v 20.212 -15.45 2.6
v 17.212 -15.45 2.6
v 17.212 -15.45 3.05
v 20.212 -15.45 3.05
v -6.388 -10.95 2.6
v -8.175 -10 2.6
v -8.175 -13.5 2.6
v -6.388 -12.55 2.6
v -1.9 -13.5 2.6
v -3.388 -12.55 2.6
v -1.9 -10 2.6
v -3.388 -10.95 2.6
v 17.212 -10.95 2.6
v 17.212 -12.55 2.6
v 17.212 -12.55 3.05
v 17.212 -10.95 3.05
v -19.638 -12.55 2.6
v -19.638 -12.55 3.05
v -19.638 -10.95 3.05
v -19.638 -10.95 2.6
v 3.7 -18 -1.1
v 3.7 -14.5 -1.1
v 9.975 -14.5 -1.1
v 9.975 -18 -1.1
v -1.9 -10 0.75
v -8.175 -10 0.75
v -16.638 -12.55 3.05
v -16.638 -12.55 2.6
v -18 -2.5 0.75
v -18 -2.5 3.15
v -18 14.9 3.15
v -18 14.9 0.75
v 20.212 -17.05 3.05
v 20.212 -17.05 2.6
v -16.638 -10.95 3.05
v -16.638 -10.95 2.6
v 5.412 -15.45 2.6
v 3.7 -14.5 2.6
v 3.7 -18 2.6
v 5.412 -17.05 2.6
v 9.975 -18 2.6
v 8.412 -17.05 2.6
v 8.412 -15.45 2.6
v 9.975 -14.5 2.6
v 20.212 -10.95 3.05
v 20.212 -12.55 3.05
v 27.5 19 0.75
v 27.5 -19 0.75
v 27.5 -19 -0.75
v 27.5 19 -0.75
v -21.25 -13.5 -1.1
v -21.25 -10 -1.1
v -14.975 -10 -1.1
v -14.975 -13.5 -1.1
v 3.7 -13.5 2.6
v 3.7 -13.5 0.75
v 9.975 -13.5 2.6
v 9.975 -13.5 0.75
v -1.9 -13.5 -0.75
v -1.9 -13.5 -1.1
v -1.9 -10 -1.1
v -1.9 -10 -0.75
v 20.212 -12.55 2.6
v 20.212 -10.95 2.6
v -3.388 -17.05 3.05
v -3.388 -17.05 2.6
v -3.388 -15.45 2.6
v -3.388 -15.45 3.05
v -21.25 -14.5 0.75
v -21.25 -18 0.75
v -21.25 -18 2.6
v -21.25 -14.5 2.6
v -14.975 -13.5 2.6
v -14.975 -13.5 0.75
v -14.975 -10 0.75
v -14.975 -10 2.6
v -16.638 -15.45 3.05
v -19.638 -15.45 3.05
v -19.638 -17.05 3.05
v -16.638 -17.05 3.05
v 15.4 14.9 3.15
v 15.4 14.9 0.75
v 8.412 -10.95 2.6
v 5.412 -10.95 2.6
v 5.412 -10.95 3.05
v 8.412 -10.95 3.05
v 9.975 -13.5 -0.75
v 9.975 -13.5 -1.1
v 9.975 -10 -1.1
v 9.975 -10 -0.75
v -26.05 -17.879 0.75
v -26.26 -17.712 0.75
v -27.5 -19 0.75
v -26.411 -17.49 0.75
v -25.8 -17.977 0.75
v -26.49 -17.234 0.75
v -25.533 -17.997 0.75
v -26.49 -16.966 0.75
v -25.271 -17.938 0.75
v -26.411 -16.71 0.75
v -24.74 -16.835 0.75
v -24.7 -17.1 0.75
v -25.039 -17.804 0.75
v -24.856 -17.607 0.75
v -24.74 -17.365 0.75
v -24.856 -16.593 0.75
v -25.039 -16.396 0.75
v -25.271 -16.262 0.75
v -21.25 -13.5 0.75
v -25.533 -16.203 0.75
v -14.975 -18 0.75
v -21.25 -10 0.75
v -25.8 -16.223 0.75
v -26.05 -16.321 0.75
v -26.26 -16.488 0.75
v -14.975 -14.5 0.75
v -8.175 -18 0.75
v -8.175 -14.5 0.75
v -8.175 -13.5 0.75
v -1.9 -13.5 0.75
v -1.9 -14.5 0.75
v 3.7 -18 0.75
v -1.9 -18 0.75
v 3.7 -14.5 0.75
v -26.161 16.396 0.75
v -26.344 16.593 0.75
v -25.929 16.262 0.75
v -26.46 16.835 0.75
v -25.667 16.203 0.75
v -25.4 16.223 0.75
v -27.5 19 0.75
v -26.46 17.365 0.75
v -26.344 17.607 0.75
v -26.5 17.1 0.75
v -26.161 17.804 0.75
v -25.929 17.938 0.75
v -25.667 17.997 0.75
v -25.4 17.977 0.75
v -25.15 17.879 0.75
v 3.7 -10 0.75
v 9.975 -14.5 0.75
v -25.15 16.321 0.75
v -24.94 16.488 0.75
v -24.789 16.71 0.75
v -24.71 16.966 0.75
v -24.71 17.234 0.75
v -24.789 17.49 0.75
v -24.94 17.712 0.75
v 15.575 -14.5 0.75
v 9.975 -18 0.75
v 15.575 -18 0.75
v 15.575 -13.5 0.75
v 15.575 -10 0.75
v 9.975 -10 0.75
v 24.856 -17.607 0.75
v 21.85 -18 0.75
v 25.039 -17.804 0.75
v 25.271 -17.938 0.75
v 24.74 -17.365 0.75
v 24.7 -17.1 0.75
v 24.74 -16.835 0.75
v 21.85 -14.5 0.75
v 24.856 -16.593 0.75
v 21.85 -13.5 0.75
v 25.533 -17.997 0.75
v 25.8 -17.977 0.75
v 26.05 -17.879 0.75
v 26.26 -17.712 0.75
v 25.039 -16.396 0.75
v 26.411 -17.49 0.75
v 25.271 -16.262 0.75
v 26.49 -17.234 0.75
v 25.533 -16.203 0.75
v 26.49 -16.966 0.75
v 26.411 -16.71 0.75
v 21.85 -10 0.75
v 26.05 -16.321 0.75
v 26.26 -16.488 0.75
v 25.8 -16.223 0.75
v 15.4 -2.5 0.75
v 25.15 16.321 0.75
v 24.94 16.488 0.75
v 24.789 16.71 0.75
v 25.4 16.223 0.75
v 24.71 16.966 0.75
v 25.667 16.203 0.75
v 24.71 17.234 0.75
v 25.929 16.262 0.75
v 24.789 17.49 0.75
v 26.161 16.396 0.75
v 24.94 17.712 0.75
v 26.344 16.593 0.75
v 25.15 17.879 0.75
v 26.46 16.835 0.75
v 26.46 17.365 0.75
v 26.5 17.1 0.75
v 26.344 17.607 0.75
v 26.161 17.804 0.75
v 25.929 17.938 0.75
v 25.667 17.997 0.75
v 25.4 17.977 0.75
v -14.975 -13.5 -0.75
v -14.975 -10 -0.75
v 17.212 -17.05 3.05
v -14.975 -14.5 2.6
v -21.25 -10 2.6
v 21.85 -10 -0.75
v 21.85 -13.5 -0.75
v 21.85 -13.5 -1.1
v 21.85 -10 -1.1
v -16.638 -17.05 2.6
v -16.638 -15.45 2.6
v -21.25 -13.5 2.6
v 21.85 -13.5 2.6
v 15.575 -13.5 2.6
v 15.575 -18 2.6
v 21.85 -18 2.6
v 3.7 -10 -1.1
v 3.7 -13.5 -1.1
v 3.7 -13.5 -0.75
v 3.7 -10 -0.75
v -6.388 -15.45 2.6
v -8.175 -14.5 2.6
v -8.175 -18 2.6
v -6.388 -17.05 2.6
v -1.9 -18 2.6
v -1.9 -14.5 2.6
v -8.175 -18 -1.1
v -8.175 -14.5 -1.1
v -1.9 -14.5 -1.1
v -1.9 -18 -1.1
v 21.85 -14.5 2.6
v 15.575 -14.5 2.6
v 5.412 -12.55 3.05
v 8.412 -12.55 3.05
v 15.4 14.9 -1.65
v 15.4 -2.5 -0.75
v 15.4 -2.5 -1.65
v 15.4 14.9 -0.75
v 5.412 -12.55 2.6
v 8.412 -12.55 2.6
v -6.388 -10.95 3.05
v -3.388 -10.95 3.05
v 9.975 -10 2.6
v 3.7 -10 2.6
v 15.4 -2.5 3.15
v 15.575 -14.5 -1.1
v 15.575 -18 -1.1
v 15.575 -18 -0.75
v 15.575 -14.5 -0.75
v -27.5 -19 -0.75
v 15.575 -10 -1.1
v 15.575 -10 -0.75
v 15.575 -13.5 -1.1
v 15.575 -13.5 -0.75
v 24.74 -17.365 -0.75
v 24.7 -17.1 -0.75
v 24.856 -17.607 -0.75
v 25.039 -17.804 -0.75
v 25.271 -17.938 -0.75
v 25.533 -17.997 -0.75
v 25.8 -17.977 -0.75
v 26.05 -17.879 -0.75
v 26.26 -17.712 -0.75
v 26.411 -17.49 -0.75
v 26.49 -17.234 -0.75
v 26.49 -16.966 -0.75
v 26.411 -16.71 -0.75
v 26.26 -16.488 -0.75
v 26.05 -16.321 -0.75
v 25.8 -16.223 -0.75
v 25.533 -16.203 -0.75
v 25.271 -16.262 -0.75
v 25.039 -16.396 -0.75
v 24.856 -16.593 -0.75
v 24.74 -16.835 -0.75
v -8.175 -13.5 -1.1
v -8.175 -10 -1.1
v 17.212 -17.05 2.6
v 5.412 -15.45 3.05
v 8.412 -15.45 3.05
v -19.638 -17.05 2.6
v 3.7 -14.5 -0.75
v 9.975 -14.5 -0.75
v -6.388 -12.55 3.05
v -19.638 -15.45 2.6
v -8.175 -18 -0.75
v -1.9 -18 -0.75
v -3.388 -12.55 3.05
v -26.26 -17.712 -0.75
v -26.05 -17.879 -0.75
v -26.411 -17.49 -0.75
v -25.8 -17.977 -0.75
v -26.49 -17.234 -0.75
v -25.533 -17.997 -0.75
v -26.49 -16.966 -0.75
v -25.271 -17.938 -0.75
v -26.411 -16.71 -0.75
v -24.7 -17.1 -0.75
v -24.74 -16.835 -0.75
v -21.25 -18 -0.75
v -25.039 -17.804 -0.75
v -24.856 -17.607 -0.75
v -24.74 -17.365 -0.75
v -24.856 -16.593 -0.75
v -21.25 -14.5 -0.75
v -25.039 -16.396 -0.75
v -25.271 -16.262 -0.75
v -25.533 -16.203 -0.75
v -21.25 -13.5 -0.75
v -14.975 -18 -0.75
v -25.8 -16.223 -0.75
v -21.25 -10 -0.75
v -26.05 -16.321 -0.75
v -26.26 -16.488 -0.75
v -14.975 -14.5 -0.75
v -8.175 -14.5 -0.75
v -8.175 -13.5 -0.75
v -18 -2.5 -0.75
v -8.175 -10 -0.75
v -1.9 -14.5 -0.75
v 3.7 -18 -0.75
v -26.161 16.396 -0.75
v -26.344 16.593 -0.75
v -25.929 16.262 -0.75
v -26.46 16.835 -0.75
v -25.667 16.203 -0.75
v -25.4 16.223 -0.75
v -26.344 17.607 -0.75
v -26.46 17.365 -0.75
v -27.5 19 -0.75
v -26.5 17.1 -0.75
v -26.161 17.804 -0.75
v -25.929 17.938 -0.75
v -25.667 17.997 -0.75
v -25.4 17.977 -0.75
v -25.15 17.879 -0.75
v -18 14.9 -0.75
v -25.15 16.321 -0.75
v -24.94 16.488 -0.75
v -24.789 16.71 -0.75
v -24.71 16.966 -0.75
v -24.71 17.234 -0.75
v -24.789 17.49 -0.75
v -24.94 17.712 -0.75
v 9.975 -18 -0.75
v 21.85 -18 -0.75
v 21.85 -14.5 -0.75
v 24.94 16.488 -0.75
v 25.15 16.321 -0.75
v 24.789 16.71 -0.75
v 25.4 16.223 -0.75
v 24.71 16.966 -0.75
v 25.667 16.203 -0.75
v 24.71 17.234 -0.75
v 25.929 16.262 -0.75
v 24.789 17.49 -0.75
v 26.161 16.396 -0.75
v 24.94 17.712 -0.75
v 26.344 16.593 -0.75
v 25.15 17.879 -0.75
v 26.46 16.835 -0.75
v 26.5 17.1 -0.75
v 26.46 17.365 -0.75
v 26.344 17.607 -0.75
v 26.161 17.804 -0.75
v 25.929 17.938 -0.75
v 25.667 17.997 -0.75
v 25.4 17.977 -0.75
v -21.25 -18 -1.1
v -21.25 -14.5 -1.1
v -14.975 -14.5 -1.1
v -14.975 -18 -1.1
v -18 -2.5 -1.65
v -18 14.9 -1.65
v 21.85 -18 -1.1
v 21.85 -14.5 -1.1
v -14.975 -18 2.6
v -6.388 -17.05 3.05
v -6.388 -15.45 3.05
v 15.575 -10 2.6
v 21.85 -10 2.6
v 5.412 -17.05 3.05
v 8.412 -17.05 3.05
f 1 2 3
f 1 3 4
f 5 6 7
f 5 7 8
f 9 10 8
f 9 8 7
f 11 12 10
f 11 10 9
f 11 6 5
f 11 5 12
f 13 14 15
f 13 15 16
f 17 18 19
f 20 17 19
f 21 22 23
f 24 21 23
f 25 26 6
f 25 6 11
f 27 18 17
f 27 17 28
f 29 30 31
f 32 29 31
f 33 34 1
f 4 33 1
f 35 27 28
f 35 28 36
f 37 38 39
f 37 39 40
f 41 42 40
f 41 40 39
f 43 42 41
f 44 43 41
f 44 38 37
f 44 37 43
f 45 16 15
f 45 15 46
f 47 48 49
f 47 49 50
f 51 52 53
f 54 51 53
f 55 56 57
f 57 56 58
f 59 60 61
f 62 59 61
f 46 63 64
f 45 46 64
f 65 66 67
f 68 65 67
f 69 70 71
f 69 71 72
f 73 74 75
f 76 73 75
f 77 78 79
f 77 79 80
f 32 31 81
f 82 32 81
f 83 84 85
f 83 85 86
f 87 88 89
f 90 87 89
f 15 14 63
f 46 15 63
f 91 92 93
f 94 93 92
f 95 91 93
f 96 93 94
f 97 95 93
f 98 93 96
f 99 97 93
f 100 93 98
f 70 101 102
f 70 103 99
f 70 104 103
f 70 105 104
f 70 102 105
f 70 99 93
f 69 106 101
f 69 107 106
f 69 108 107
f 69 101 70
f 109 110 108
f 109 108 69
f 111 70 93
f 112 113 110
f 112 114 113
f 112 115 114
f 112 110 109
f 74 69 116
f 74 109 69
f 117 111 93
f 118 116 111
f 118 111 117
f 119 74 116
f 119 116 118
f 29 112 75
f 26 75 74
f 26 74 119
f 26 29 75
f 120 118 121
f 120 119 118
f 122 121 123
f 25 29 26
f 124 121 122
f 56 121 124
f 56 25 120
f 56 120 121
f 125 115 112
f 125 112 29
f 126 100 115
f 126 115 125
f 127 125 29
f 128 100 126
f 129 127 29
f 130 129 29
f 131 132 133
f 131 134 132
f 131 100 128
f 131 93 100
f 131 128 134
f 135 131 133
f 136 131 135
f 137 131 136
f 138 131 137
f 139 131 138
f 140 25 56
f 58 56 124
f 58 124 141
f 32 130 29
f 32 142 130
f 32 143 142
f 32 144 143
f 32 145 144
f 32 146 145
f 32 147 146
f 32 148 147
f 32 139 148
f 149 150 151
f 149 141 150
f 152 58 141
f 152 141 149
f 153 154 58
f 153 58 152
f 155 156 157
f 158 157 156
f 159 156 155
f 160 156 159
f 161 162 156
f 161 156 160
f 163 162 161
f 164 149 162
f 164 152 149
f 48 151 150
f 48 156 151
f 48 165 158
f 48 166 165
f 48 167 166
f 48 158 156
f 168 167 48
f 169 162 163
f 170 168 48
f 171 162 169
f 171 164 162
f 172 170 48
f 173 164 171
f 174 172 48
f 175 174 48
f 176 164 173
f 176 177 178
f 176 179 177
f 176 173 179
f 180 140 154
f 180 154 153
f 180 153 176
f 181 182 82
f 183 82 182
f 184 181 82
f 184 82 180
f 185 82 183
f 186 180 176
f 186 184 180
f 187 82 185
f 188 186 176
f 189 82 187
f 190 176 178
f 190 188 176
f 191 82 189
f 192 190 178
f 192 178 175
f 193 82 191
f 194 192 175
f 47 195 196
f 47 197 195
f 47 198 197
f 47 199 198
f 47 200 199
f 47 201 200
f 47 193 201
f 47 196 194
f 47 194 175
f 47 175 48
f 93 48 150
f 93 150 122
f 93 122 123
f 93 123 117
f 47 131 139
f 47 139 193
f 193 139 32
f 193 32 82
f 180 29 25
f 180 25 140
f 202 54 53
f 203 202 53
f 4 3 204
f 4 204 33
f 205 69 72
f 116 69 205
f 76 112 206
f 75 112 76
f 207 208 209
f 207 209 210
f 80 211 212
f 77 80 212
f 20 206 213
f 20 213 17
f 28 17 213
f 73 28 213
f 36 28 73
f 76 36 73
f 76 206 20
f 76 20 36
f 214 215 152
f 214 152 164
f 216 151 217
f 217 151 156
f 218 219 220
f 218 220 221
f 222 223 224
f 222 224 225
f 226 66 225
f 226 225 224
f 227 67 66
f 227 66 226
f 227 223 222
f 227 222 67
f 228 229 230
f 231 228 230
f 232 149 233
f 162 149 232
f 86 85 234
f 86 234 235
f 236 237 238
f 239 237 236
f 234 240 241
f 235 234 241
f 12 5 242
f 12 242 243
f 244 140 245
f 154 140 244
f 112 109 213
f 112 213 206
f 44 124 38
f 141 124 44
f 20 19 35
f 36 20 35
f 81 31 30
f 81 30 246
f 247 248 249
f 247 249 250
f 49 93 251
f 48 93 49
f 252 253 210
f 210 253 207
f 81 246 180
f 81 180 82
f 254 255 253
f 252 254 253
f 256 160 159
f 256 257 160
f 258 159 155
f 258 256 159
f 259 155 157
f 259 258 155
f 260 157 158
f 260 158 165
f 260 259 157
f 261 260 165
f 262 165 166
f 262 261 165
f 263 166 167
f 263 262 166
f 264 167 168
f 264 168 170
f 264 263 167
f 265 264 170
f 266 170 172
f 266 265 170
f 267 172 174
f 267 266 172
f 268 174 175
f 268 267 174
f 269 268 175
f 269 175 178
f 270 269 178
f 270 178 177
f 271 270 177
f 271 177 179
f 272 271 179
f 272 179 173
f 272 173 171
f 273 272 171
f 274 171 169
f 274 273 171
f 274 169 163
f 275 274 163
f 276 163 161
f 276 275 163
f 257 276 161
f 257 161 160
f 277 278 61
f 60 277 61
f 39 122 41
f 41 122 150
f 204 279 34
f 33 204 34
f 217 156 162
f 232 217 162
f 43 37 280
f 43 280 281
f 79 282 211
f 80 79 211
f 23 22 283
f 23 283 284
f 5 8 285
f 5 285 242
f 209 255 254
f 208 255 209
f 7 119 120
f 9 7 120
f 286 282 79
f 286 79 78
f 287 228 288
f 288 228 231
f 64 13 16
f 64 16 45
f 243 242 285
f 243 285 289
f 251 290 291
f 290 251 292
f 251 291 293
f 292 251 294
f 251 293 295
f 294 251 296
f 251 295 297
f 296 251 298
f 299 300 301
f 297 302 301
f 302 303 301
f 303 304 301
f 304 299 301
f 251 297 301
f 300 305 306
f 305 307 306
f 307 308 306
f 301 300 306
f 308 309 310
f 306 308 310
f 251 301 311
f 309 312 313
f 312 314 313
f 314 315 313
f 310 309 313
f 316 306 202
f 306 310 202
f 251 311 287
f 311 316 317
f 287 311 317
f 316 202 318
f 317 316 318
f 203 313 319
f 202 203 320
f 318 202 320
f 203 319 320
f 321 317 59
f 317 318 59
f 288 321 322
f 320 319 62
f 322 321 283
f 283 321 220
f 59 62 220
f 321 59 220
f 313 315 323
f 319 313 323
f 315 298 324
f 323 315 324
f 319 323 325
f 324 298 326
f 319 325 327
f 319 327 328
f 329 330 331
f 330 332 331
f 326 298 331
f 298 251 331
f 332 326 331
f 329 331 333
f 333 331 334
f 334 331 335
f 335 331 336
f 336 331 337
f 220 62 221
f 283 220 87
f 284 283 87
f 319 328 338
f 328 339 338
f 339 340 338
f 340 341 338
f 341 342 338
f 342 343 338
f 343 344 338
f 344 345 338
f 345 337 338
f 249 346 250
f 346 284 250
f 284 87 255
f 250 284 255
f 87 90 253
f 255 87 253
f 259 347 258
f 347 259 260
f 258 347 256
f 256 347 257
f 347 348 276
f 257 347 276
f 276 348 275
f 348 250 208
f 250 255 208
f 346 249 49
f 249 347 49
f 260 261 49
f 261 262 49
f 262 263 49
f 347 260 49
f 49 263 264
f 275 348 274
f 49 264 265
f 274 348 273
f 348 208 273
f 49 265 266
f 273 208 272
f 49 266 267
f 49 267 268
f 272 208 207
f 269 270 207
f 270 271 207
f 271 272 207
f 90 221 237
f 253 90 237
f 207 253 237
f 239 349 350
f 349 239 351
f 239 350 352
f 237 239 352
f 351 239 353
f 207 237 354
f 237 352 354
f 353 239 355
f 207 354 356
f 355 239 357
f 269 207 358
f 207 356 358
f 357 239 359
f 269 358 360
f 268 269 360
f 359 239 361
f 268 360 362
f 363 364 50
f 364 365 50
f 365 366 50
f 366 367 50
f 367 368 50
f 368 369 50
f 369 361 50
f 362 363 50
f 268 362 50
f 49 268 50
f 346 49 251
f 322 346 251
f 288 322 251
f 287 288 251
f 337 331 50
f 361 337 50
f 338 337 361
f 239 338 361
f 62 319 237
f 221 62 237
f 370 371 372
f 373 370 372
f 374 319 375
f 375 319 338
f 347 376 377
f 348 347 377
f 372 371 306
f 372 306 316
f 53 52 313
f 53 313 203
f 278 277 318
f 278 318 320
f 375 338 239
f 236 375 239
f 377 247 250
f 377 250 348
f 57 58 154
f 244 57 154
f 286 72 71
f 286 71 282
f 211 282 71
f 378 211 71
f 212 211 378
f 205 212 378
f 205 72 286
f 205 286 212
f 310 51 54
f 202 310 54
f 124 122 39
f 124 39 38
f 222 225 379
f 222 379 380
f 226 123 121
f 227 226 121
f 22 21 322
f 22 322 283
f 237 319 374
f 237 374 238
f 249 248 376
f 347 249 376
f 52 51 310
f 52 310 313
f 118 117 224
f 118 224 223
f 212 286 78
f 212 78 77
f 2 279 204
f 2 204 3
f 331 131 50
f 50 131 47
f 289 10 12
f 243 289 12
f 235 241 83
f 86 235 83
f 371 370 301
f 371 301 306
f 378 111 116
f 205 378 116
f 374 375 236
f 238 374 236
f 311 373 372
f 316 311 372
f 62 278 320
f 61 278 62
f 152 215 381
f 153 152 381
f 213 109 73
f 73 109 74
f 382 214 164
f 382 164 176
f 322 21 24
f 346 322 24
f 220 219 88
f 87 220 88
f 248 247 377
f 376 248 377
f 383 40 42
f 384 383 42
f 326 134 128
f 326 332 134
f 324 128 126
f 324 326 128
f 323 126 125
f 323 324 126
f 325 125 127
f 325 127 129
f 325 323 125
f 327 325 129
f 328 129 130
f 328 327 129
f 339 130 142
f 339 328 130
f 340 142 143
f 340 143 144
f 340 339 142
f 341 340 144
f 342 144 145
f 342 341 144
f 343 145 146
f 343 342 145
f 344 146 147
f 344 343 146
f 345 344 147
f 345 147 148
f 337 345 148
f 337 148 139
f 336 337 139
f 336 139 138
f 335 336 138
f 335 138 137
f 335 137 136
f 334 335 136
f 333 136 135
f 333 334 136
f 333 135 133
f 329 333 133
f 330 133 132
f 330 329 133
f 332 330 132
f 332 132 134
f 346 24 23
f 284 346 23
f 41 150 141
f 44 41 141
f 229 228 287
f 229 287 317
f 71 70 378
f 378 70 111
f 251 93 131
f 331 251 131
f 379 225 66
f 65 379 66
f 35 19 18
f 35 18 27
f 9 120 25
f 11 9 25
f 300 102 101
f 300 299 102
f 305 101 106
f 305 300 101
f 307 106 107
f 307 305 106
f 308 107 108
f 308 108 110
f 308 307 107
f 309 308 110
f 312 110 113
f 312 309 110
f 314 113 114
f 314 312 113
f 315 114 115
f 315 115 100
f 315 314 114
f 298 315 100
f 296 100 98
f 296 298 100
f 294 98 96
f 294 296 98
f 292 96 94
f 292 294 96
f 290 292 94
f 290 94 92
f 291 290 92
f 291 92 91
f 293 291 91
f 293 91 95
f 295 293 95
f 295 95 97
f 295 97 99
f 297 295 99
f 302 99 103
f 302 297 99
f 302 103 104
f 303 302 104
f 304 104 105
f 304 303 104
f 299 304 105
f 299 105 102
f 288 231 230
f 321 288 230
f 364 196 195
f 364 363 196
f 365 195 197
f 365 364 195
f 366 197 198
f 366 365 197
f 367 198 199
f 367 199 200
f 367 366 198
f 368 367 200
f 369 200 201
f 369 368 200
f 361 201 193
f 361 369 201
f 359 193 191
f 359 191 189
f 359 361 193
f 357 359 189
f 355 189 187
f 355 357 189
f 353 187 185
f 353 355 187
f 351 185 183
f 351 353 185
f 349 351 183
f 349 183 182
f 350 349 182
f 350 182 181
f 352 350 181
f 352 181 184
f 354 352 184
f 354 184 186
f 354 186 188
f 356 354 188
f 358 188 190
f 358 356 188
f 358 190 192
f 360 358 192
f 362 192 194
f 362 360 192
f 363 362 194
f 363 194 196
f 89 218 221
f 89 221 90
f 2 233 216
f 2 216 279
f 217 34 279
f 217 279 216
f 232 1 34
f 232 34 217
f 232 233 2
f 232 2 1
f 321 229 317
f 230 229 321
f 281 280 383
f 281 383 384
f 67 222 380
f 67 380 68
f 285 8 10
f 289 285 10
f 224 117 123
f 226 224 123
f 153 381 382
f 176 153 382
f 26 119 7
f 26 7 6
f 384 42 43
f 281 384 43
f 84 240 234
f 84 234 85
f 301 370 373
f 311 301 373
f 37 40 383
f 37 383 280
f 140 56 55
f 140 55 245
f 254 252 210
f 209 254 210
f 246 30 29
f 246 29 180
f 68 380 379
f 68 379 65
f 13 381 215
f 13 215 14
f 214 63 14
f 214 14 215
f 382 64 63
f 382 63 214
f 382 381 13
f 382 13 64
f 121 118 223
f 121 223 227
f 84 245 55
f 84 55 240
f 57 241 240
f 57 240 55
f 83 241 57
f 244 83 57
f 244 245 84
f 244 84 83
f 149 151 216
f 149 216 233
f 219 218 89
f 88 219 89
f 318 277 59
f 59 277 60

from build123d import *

# Parameters (mm, degrees)
SKETCH1_W           = 55
SKETCH1_H           = 38
SKETCH1_R           = 0.9
BOSS_EXTRUDE1_DEPTH = 0.75
SKETCH2_W           = 33.4
SKETCH2_H           = 17.4
BOSS_EXTRUDE2_DEPTH = 2.4
SKETCH4_W           = 6.275
SKETCH4_H           = 3.5
BOSS_EXTRUDE3_DEPTH = 1.85
SKETCH6_W           = 3
SKETCH6_H           = 1.6
BOSS_EXTRUDE4_DEPTH = 0.45


with BuildPart() as part:
    # Sketch1 → Boss-Extrude1 (new, symmetric)
    with BuildSketch(Plane.XY):
        Rectangle(SKETCH1_W, SKETCH1_H)
        with Locations((25.6, 17.1)):
            Circle(SKETCH1_R, mode=Mode.SUBTRACT)
        with Locations(Location((-25.6, 17.1, 0), (0, 0, 180))):
            Circle(SKETCH1_R, mode=Mode.SUBTRACT)
        with Locations(Location((25.6, -17.1, 0), (0, 0, 180))):
            Circle(SKETCH1_R, mode=Mode.SUBTRACT)
        with Locations((-25.6, -17.1)):
            Circle(SKETCH1_R, mode=Mode.SUBTRACT)
    extrude(amount=BOSS_EXTRUDE1_DEPTH, both=True)

    # Sketch2 → Boss-Extrude2 (add, symmetric)
    with BuildSketch(Plane.XY.offset(0.75)):
        with Locations((-1.3, 6.2)):
            Rectangle(SKETCH2_W, SKETCH2_H)
    extrude(amount=BOSS_EXTRUDE2_DEPTH, both=True)

    # Sketch4 → Boss-Extrude3 (add, symmetric)
    with BuildSketch(Plane.XY.offset(0.75)):
        with Locations((18.7125, -16.25)):
            Rectangle(SKETCH4_W, SKETCH4_H)
        with Locations((-18.1125, -16.25)):
            Rectangle(SKETCH4_W, SKETCH4_H)
        with Locations((6.8375, -16.25)):
            Rectangle(SKETCH4_W, SKETCH4_H)
        with Locations((-5.0375, -16.25)):
            Rectangle(SKETCH4_W, SKETCH4_H)
        with Locations((-18.1125, -11.75)):
            Rectangle(SKETCH4_W, SKETCH4_H)
        with Locations((-5.0375, -11.75)):
            Rectangle(SKETCH4_W, SKETCH4_H)
        with Locations((6.8375, -11.75)):
            Rectangle(SKETCH4_W, SKETCH4_H)
        with Locations((18.7125, -11.75)):
            Rectangle(SKETCH4_W, SKETCH4_H)
    extrude(amount=BOSS_EXTRUDE3_DEPTH, both=True)

    # Sketch6 → Boss-Extrude4 (add, symmetric)
    with BuildSketch(Plane.XY.offset(2.6)):
        with Locations((18.7125, -16.25)):
            Rectangle(SKETCH6_W, SKETCH6_H)
        with Locations((6.9125, -16.25)):
            Rectangle(SKETCH6_W, SKETCH6_H)
        with Locations((-4.8875, -16.25)):
            Rectangle(SKETCH6_W, SKETCH6_H)
        with Locations((6.9125, -11.75)):
            Rectangle(SKETCH6_W, SKETCH6_H)
        with Locations((-4.8875, -11.75)):
            Rectangle(SKETCH6_W, SKETCH6_H)
        with Locations((18.7125, -11.75)):
            Rectangle(SKETCH6_W, SKETCH6_H)
        with Locations((-18.1375, -16.25)):
            Rectangle(SKETCH6_W, SKETCH6_H)
        with Locations((-18.1375, -11.75)):
            Rectangle(SKETCH6_W, SKETCH6_H)
    extrude(amount=BOSS_EXTRUDE4_DEPTH, both=True)


solid = part.part
